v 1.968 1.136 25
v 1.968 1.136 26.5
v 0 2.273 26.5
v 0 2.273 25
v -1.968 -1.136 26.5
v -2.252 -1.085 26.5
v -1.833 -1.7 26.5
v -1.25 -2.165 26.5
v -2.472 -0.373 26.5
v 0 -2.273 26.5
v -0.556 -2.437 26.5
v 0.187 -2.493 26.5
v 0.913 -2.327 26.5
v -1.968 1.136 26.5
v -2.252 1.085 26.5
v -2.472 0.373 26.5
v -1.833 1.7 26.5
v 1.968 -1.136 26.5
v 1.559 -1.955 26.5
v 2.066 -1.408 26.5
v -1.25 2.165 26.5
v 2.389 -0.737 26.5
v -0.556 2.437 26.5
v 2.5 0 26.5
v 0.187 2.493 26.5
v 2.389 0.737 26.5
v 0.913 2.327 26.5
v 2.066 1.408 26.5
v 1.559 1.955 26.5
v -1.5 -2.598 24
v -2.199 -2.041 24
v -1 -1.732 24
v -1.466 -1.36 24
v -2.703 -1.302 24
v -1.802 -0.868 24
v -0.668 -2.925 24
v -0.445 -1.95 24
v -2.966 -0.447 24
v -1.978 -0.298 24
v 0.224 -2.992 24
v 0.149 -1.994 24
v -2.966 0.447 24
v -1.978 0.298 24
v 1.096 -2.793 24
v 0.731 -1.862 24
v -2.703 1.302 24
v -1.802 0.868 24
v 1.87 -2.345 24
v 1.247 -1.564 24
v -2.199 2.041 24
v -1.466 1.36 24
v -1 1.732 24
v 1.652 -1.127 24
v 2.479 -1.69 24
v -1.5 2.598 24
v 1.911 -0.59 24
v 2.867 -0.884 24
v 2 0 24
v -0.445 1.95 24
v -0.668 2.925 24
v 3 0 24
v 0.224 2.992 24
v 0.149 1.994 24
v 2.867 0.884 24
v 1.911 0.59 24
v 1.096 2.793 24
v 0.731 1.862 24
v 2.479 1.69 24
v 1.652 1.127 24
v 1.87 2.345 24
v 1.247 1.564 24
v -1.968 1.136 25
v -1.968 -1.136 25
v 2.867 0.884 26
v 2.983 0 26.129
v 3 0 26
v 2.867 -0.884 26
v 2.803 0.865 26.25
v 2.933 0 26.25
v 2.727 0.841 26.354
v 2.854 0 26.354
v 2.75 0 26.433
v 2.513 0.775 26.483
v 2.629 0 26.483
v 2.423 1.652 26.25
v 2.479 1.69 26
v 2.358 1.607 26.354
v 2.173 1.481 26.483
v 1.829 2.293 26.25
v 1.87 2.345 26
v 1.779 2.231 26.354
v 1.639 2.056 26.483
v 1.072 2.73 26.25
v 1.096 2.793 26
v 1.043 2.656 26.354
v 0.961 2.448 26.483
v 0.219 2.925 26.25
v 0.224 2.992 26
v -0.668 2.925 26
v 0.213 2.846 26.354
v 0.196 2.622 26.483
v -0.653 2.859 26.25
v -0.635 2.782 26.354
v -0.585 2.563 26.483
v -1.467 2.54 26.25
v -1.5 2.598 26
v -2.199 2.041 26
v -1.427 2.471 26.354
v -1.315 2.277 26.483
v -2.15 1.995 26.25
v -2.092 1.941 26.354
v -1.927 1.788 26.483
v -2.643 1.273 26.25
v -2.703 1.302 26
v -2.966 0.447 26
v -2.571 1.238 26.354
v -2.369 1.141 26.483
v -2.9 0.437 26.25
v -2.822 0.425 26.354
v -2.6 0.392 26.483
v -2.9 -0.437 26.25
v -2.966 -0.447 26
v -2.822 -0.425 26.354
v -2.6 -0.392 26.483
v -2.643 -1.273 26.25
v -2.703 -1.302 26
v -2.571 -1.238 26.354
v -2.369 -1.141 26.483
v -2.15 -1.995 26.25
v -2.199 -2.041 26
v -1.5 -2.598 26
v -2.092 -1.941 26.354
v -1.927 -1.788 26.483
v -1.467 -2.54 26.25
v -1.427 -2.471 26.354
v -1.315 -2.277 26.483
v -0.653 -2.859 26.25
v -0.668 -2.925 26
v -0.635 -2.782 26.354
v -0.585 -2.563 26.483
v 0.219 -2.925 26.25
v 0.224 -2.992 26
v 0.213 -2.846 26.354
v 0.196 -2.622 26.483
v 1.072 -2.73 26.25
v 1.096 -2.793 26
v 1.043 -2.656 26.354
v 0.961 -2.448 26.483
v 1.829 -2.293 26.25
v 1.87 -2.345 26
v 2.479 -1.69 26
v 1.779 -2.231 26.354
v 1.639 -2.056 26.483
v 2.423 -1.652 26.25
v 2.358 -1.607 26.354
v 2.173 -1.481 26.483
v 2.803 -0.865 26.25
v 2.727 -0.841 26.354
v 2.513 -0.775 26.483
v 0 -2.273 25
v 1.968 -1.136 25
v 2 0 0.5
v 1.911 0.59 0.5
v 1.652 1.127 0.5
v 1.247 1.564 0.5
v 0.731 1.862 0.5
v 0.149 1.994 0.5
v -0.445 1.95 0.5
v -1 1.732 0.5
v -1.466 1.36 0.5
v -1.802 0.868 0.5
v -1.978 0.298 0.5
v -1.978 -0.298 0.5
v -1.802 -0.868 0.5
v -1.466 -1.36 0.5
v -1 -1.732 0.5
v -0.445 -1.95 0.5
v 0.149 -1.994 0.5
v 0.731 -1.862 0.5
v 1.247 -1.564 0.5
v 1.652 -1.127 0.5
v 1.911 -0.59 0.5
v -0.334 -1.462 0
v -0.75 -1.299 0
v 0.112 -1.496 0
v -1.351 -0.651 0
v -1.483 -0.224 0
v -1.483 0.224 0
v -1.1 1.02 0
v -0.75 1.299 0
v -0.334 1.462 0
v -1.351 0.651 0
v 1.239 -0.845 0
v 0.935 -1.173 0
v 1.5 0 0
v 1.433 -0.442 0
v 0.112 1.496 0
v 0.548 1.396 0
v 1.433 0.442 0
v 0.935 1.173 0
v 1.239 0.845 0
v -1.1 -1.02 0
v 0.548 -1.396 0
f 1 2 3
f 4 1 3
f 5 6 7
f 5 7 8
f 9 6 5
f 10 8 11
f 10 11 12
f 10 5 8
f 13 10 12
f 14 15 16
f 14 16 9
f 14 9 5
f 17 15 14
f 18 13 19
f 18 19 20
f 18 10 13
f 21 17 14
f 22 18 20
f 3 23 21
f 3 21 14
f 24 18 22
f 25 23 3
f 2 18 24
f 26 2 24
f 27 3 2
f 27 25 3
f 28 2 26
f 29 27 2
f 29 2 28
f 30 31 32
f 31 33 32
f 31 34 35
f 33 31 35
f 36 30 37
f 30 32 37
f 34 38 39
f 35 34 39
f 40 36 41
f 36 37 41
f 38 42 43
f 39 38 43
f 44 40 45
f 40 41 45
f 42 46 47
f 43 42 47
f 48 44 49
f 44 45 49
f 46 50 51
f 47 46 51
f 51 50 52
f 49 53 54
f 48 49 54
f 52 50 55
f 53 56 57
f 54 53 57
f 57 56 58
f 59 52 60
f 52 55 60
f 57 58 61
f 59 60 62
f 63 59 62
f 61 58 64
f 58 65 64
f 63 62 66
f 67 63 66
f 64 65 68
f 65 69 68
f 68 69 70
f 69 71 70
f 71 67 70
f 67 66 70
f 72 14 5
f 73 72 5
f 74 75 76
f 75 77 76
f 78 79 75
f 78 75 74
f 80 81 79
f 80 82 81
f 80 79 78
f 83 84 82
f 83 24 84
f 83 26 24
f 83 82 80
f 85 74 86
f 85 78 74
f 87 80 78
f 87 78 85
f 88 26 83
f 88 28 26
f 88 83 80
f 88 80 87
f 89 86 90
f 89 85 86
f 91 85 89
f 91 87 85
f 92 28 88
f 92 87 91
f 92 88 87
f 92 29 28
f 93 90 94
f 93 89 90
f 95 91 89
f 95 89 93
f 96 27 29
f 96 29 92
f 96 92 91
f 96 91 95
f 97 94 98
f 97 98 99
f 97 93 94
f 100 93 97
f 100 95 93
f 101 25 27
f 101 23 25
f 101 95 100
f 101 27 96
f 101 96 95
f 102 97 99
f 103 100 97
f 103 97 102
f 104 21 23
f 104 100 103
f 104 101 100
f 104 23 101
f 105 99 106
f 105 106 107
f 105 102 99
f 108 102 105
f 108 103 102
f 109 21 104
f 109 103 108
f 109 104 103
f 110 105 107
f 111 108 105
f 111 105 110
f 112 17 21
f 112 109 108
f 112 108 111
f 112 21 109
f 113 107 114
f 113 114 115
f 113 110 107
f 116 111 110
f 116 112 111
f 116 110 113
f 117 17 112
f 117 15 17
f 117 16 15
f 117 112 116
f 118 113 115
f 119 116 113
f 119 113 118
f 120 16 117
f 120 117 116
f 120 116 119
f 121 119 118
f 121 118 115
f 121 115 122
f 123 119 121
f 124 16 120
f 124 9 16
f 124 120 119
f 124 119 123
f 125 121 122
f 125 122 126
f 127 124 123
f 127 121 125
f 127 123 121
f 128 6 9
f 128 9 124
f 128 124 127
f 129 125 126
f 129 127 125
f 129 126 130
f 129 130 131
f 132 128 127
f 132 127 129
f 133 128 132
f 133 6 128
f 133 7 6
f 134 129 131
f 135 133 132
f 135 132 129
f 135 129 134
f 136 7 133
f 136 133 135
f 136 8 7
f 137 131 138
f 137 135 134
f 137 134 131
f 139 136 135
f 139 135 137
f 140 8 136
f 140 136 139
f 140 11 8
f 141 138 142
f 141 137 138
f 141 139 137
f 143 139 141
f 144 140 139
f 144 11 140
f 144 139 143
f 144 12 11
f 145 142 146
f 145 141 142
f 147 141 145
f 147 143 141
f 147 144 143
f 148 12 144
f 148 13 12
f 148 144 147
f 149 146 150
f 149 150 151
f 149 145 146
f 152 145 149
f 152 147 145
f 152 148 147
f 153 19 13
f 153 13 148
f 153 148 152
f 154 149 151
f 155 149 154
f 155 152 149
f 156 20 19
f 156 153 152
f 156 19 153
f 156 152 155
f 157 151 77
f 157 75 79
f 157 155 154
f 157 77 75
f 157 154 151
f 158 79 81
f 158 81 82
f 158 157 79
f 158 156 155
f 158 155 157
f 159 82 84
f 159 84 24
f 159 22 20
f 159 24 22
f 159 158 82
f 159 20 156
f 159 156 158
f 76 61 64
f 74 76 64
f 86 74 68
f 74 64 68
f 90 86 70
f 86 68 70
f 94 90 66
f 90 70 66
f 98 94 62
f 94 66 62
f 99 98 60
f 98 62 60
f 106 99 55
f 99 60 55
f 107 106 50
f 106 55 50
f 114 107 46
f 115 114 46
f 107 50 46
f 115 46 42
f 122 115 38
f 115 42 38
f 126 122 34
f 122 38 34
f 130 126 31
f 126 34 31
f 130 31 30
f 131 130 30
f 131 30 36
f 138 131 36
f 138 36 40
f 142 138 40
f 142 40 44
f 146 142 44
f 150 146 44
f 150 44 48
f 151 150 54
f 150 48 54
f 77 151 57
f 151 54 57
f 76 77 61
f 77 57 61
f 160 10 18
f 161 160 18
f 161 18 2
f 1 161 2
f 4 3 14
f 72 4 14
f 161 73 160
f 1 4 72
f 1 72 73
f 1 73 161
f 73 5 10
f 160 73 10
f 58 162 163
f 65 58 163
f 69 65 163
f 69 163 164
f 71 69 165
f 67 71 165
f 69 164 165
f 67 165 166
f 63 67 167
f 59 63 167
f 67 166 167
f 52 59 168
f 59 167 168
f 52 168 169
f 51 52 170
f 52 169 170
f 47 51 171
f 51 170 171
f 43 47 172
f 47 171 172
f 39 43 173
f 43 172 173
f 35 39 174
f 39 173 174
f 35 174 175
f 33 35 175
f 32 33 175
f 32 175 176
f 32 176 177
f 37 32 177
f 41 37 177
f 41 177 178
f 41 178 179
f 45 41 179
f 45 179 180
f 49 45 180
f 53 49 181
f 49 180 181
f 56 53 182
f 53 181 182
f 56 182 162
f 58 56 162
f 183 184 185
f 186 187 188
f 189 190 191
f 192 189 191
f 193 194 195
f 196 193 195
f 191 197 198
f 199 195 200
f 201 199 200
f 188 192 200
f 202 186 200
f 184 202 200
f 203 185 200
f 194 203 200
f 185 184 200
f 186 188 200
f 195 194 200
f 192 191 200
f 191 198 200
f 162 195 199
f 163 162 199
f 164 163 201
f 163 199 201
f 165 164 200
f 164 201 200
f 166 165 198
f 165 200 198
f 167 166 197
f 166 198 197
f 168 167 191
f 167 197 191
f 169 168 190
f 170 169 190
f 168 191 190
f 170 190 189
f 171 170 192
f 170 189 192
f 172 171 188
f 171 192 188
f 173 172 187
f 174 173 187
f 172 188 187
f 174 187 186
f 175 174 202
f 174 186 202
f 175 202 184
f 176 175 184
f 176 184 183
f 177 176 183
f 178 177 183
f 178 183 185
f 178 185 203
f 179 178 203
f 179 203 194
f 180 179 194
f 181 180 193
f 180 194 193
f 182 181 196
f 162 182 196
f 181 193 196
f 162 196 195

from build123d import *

# Parameters (mm, degrees)
SKETCH_1_R          = 2
EXTRUDE_1_DEPTH     = 24
SKETCH_2_R          = 3
EXTRUDE_2_DEPTH     = 2.5
CUT_EXTRUDE_1_DEPTH = 1.5
FILLET_1_R          = 0.5
CHAMFER_1_SIZE      = 0.5


with BuildPart() as part:
    # 草图1 → 凸台-拉伸1 (new body)
    with BuildSketch(Plane.XY):
        Circle(SKETCH_1_R)
    extrude(amount=EXTRUDE_1_DEPTH)

    # 草图2 → 凸台-拉伸2 (add)
    with BuildSketch(Plane.XY.offset(24)):
        Circle(SKETCH_2_R)
    extrude(amount=EXTRUDE_2_DEPTH)

    # 草图3 → 切除-拉伸1 (cut)
    with BuildSketch(Plane.XY.offset(26.5)):
        Polygon((0, 2.272766295), (-1.968273348, 1.136383147), (-1.968273348, -1.136383147), (0, -2.272766295), (1.968273348, -1.136383147), (1.968273348, 1.136383147), align=None)
    extrude(amount=-CUT_EXTRUDE_1_DEPTH, mode=Mode.SUBTRACT)

    # 圆角1
    fillet_1_edges = [part.edges().sort_by_distance(p)[0] for p in [
        (-3, 0, 26.5),
    ]]
    fillet(fillet_1_edges, radius=FILLET_1_R)

    # 倒角1
    chamfer_1_edges = [part.edges().sort_by_distance(p)[0] for p in [
        (-2, 0, 0),
    ]]
    chamfer(chamfer_1_edges, length=CHAMFER_1_SIZE)


solid = part.part
